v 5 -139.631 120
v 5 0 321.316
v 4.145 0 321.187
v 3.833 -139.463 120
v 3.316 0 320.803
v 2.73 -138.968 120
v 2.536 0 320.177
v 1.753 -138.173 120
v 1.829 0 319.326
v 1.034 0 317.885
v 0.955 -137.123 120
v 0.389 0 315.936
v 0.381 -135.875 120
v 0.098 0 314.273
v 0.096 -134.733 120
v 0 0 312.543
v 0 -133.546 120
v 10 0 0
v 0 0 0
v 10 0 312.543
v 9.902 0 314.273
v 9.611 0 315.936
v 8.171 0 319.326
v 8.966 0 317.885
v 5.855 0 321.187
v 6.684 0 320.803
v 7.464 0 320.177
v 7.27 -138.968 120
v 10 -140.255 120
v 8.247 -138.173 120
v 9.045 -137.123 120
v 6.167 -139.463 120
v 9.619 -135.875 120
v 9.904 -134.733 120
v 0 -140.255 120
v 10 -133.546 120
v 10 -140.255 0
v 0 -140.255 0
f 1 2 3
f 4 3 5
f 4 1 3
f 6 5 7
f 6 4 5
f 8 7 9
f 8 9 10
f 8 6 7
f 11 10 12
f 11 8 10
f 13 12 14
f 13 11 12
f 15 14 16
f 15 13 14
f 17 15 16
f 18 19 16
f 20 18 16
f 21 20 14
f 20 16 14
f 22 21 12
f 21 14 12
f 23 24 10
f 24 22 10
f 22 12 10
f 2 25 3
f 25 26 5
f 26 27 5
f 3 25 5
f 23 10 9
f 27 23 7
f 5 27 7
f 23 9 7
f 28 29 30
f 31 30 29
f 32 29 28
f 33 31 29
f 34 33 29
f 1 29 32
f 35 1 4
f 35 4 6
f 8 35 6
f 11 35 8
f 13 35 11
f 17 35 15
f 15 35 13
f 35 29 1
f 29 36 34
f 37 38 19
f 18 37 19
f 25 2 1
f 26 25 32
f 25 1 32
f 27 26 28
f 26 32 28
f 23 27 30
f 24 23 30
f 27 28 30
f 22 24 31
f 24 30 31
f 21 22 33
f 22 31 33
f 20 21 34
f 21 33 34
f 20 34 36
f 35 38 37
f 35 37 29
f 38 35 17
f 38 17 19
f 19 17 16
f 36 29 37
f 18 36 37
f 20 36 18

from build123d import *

# Parameters (mm, degrees)
F0_W     = 0.6239625519
F0_H     = 120
F1_DEPTH = 10
F2_R     = 4.99999


# Not quite as in the source:
# - a fillet or chamfer is up to 0.001 mm smaller than in the source, because OpenCascade refuses the exact size


with BuildPart() as f1:
    # F0 (on Right) → F1 (new body)
    with BuildSketch(Plane.YZ):
        with Locations((-139.943079155, 60)):
            Rectangle(F0_W, F0_H)
        Polygon((-139.631097879, 120), (-139.631097879, 0), (0, 0), (0, 321.3160612199), align=None)
    extrude(amount=F1_DEPTH)

    # F2 (radius 5 in the source; OpenCascade refuses exactly that, so slightly less here)
    f2_edges = [f1.edges().sort_by_distance(p)[0] for p in [
        (10, -69.815549, 220.658031),
        (0, -69.815549, 220.658031),
    ]]
    fillet(f2_edges, radius=F2_R)


solid = f1.part
